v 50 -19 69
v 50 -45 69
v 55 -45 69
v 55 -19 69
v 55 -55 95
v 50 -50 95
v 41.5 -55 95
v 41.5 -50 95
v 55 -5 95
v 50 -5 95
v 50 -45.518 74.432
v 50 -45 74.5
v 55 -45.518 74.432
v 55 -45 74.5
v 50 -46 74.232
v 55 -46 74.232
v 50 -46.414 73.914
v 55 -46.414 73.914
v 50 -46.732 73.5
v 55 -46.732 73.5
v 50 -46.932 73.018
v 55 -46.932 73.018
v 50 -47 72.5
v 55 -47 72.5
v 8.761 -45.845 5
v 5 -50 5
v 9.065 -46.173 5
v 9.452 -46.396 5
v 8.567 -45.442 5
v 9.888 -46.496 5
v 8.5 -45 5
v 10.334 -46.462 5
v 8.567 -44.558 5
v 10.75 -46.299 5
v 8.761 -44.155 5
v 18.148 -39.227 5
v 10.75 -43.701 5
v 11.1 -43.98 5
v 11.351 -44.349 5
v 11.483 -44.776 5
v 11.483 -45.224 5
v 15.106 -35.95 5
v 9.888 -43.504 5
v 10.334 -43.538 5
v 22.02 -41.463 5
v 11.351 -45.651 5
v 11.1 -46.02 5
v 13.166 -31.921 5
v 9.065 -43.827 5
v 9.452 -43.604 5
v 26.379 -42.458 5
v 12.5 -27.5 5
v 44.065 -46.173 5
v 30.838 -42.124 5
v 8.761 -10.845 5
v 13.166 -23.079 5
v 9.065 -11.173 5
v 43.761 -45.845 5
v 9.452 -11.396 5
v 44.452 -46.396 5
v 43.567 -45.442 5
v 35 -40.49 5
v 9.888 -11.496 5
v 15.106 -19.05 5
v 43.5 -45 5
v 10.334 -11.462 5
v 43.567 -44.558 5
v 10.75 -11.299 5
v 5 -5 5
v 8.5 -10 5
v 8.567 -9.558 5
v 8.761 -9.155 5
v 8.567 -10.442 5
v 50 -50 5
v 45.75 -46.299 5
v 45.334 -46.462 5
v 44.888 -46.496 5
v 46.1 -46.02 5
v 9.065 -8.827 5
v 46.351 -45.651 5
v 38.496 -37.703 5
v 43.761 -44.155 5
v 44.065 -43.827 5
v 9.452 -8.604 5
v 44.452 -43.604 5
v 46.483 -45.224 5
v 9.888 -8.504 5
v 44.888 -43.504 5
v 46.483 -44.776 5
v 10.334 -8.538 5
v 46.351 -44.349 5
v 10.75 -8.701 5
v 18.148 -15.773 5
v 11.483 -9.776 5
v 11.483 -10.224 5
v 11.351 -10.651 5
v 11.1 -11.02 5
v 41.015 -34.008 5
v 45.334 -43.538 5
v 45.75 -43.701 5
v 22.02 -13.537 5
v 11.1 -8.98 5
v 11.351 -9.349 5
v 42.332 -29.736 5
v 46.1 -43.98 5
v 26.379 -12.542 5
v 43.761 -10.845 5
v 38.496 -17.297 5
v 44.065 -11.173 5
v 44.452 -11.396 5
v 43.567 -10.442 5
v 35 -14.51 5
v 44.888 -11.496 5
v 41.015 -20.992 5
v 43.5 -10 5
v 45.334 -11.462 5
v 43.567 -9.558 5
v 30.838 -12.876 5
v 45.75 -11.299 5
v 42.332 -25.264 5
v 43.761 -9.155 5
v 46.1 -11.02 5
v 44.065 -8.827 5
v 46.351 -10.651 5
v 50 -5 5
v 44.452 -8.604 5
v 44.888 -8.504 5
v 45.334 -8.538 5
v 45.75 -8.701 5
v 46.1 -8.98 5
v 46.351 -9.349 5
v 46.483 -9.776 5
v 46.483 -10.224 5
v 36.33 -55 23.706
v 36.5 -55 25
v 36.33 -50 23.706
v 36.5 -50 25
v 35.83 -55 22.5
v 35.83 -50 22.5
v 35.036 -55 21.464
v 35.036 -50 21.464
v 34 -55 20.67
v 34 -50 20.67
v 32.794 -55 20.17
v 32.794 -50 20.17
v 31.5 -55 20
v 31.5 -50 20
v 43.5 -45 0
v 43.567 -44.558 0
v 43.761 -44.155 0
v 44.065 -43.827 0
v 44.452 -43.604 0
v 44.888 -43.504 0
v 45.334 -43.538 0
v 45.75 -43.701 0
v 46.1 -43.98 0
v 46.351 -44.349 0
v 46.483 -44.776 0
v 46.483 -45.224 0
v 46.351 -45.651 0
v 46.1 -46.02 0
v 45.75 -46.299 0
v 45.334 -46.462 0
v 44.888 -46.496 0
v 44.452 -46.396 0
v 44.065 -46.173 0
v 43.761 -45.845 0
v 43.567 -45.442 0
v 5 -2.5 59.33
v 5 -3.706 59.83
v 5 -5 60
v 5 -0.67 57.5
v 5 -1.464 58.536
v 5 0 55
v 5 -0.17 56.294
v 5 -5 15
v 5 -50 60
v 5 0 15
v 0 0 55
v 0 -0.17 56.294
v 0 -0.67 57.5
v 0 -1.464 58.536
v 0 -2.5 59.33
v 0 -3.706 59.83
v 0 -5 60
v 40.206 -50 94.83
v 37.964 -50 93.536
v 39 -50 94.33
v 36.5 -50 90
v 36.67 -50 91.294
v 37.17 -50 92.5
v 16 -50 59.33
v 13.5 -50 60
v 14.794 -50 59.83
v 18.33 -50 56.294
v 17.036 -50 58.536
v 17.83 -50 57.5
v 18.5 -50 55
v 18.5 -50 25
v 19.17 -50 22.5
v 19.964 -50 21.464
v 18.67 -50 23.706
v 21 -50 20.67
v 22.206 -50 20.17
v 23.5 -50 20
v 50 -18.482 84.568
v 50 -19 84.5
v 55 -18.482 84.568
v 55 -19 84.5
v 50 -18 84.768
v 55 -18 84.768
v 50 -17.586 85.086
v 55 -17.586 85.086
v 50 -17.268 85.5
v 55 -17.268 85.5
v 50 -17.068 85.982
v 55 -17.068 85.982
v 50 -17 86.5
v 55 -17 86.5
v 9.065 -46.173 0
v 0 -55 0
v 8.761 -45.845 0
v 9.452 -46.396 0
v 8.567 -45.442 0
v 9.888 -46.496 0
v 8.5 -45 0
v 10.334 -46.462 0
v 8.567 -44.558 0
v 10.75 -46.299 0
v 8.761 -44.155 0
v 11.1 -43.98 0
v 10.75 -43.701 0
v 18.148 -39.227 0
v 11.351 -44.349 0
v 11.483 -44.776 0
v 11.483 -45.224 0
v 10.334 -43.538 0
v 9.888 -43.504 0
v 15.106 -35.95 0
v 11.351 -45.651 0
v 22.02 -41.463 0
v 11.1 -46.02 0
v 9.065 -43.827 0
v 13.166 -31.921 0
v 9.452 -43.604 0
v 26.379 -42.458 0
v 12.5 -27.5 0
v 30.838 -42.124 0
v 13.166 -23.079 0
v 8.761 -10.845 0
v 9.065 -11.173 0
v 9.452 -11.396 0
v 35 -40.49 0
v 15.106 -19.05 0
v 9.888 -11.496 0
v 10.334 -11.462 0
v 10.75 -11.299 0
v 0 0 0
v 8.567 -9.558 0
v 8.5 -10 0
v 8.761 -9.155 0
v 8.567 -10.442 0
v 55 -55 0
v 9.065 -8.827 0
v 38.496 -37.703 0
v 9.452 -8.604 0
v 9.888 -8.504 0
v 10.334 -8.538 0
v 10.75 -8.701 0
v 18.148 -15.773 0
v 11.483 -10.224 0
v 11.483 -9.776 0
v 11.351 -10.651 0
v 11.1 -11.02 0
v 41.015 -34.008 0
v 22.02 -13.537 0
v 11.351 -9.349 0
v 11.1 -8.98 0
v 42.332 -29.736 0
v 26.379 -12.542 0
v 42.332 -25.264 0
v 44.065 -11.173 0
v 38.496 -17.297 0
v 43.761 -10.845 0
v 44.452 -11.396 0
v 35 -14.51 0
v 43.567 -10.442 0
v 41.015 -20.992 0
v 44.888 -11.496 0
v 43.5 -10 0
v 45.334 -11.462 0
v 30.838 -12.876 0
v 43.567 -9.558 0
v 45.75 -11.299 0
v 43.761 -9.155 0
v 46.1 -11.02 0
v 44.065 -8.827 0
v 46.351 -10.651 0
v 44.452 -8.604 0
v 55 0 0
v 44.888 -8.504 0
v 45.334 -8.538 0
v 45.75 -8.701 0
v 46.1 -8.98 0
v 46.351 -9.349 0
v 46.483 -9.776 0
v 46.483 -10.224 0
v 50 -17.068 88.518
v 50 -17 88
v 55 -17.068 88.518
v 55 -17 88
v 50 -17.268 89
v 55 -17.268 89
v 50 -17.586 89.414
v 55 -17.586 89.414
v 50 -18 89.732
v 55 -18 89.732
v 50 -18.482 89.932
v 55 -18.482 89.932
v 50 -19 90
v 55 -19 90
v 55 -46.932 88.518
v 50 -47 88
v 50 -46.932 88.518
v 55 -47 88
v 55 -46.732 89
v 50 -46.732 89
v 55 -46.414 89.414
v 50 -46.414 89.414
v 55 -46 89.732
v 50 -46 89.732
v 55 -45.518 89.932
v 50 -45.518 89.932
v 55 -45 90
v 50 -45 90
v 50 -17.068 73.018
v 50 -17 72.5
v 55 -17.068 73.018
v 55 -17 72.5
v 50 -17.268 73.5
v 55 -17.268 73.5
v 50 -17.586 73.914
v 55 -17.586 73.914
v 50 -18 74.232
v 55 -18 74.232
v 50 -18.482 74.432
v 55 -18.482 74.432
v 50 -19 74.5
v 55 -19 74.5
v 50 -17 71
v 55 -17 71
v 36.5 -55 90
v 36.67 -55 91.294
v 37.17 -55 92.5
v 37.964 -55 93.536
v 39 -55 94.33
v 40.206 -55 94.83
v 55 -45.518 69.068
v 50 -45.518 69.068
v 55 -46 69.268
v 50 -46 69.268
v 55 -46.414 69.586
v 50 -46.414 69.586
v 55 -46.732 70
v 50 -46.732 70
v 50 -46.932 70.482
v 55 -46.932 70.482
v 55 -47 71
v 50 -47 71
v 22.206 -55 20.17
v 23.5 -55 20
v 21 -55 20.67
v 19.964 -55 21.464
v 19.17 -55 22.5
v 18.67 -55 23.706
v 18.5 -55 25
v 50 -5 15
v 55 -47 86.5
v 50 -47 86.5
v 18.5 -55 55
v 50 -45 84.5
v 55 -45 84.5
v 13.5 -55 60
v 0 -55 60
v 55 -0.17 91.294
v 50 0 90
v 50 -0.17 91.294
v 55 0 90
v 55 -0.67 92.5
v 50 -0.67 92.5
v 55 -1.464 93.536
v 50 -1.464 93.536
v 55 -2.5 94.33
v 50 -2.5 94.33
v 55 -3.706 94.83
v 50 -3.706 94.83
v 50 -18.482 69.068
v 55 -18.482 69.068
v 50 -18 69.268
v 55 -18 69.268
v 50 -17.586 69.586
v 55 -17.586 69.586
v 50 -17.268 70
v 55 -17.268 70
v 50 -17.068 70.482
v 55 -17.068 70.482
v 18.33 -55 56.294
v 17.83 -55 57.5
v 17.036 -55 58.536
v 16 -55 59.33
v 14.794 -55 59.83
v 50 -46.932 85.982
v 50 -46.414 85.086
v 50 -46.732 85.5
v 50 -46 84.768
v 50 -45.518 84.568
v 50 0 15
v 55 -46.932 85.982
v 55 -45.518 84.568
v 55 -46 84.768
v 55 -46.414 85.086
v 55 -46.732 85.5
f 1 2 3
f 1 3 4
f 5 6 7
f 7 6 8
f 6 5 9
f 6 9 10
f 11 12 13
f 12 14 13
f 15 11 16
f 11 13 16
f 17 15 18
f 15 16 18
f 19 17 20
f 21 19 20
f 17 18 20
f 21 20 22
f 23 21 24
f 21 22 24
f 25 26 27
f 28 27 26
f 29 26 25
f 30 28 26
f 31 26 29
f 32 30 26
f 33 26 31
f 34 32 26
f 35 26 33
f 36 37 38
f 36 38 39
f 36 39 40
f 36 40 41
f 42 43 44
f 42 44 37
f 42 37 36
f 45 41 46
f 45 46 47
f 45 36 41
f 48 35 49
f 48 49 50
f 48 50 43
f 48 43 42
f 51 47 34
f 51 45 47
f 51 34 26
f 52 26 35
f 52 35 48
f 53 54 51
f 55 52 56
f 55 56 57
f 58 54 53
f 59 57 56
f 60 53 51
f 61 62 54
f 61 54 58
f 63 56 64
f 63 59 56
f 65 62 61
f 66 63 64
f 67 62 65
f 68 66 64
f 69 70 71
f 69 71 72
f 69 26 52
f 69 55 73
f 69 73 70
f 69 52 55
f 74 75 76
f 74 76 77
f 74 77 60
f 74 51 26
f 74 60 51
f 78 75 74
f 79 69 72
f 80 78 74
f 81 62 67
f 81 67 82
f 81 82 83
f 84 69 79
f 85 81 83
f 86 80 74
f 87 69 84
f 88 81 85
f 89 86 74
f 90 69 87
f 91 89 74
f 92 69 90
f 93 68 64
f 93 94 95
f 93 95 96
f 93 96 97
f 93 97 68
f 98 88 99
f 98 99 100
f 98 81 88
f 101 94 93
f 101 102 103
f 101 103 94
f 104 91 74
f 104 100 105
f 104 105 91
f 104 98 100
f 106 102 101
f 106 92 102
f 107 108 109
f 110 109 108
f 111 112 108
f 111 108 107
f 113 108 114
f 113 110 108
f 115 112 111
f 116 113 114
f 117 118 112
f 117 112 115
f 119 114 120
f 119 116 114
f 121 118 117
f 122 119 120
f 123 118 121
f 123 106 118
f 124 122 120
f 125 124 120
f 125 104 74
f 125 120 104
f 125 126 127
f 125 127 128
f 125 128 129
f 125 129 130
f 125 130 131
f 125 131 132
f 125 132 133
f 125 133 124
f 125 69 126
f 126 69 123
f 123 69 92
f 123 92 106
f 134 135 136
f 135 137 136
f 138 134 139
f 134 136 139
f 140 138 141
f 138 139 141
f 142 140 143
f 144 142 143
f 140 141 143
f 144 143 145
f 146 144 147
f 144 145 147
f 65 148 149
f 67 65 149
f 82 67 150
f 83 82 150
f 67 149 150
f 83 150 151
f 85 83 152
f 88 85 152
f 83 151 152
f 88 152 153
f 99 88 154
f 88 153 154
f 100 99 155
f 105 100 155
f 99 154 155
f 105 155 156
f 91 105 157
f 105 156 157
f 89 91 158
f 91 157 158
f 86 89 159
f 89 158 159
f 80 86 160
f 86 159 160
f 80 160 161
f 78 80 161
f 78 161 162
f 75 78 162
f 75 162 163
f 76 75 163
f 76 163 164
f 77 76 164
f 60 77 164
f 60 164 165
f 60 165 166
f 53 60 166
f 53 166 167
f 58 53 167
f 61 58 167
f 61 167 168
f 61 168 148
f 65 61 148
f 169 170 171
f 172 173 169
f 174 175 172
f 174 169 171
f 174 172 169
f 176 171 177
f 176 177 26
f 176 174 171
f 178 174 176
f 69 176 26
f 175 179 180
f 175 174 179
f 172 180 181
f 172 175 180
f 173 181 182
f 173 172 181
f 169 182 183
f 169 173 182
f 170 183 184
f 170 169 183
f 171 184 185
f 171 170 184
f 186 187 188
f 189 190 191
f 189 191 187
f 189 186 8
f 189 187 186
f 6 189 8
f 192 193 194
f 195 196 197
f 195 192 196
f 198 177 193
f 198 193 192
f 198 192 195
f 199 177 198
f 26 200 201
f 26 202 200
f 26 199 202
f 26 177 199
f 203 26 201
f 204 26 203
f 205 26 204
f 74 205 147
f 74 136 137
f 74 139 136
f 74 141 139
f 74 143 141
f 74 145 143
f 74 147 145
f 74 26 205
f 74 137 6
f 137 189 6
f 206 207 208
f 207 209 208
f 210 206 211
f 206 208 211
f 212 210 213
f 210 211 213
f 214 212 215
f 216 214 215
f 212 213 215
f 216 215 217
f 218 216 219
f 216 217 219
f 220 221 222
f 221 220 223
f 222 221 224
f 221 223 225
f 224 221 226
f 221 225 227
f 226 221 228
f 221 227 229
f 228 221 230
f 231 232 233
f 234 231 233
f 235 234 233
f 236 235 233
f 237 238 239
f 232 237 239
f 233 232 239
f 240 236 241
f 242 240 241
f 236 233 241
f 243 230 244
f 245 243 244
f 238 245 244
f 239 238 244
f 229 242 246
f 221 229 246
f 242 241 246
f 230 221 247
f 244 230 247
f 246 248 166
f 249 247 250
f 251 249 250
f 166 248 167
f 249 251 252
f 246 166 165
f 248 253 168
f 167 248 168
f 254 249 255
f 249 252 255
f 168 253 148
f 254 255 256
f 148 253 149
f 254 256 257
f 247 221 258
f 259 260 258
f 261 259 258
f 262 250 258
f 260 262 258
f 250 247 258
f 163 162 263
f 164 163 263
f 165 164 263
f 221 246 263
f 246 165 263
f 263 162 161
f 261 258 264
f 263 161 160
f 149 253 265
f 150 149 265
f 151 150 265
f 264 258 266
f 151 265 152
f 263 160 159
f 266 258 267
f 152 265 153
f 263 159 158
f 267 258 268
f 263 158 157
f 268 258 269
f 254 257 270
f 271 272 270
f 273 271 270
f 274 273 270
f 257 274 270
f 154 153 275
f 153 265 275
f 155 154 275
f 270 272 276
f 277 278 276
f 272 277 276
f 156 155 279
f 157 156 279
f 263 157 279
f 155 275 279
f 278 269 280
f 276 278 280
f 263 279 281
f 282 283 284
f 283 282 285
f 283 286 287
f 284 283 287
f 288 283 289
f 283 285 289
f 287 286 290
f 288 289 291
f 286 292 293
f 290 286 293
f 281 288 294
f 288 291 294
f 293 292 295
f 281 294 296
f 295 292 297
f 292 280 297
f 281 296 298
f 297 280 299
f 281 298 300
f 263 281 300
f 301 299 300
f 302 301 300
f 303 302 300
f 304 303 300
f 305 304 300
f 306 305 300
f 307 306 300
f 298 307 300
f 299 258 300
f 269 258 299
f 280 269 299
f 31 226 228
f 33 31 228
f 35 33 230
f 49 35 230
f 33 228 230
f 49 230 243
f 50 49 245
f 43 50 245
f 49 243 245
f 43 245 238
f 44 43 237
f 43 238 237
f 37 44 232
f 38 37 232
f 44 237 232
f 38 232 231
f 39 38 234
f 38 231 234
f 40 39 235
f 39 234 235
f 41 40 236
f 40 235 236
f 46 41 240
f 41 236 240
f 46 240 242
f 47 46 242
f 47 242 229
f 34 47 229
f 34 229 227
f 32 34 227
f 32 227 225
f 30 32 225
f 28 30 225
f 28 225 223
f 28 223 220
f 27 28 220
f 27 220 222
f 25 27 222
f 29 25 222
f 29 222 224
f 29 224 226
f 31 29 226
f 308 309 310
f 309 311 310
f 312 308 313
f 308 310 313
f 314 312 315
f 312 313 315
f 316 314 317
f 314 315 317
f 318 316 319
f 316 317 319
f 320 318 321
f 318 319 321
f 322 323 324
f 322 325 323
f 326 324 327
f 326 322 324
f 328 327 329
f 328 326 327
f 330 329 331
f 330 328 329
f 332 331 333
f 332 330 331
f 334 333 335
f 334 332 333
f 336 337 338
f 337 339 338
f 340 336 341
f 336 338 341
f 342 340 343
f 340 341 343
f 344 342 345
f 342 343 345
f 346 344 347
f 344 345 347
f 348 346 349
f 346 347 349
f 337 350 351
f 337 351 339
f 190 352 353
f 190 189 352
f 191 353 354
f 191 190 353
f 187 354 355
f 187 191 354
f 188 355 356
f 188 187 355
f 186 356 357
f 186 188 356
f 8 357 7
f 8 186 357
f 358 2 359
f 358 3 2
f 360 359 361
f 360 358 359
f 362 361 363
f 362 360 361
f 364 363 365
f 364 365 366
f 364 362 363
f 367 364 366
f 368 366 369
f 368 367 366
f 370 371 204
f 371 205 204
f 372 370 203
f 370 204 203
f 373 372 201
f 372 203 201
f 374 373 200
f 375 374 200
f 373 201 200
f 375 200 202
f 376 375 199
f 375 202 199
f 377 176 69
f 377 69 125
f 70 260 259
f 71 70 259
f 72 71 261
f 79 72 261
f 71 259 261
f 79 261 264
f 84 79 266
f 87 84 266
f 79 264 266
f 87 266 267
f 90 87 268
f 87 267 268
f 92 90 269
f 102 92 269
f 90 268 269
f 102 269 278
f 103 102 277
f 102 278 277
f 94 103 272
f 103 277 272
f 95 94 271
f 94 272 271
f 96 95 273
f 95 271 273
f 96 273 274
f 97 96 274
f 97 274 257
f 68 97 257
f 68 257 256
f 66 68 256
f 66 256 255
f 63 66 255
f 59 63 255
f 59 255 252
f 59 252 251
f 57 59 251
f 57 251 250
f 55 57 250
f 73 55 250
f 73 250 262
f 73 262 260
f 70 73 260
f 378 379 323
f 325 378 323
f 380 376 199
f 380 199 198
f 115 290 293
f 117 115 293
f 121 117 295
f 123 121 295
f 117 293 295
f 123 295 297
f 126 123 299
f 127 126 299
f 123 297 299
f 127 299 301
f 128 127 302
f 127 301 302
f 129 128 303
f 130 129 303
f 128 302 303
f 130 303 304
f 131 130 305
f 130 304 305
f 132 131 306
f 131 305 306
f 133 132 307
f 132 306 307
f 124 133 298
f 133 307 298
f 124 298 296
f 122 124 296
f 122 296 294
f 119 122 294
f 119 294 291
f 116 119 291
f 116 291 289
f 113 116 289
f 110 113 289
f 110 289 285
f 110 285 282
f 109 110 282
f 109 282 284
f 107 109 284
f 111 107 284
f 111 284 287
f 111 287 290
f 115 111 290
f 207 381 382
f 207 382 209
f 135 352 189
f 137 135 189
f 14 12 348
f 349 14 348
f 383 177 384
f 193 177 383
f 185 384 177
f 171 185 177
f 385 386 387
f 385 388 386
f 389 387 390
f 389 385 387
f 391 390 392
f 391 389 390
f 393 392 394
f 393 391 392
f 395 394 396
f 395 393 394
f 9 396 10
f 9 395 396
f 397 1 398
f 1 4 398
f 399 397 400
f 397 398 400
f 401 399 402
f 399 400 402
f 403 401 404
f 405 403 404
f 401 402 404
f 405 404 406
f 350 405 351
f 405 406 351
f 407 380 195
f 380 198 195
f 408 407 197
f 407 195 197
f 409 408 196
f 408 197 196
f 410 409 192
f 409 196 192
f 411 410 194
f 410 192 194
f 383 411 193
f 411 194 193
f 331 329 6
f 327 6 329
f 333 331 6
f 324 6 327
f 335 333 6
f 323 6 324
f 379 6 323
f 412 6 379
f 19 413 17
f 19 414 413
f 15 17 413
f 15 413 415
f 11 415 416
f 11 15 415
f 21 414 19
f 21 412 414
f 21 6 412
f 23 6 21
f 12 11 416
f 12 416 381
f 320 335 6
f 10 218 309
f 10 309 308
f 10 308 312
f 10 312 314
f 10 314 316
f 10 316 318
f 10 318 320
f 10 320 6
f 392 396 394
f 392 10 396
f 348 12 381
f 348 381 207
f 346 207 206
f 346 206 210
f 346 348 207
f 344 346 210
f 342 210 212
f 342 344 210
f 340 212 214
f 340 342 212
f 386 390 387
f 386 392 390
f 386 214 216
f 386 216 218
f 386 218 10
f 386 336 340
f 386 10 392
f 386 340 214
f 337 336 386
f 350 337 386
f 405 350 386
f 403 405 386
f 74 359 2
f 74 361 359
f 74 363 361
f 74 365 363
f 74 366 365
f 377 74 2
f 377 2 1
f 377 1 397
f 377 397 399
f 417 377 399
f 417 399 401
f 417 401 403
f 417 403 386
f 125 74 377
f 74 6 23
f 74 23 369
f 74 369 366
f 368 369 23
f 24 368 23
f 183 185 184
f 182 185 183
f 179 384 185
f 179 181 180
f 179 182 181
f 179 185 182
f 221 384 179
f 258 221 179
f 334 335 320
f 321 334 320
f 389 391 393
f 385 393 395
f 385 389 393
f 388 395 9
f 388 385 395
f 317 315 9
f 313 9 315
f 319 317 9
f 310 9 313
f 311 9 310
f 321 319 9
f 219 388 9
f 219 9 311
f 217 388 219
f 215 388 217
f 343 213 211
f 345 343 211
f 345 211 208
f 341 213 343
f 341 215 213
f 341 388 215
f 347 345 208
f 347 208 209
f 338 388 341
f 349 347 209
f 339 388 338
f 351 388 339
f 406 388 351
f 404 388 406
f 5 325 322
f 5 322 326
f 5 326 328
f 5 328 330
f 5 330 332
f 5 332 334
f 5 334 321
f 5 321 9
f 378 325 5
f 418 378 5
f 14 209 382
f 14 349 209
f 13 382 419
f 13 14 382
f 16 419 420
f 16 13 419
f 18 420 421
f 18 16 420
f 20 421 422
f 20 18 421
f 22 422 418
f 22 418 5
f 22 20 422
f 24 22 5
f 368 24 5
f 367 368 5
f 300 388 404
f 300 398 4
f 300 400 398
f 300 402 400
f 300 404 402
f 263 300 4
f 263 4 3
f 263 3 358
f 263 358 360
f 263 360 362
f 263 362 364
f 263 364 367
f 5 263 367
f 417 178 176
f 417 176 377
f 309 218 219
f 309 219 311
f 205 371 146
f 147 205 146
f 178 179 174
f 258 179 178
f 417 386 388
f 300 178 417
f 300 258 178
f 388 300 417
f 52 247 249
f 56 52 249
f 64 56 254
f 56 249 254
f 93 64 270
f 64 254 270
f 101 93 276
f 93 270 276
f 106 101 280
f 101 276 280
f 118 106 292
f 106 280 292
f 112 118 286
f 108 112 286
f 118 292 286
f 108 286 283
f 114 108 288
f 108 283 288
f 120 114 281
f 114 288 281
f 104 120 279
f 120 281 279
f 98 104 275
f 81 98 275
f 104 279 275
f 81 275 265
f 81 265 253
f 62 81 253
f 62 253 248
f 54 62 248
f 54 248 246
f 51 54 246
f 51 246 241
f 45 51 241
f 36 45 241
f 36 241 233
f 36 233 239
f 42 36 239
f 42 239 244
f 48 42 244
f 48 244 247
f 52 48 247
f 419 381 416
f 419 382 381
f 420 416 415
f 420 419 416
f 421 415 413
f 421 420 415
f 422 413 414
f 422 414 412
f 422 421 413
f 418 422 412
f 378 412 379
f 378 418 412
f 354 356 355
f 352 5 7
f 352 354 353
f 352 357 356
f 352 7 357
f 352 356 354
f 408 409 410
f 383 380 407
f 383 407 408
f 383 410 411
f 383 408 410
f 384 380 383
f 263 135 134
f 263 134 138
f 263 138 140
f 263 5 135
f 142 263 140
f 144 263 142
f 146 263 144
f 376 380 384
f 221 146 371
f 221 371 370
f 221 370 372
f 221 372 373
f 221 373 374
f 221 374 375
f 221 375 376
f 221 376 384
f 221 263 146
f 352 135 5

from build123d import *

# Parameters (mm, degrees)
CROQUIS1_W              = 55
CROQUIS1_H              = 55
SALIENTE_EXTRUIR1_DEPTH = 60
CROQUIS2_W              = 45
CROQUIS2_H              = 45
CORTAR_EXTRUIR1_DEPTH   = 55
CORTAR_EXTRUIR2_REACH   = 57
CROQUIS3_W              = 18
CROQUIS3_H              = 40
CORTAR_EXTRUIR3_REACH   = 57
CROQUIS4_W              = 45
CROQUIS4_H              = 45
CORTAR_EXTRUIR4_REACH   = 62
CROQUIS5_R              = 1.5
CROQUIS5_R_2            = 15
SALIENTE_EXTRUIR2_DEPTH = 35
REDONDEO3_R             = 5
CORTAR_EXTRUIR5_REACH   = 7
CROQUIS7_W              = 5.5
CROQUIS7_H              = 30
REDONDEO4_R             = 2


with BuildPart() as part:
    # Croquis1 → Saliente-Extruir1 (new body)
    with BuildSketch(Plane.XY):
        with Locations((27.5, -27.5)):
            Rectangle(CROQUIS1_W, CROQUIS1_H)
    extrude(amount=SALIENTE_EXTRUIR1_DEPTH)

    # Croquis2 → Cortar-Extruir1 (cut)
    with BuildSketch(Plane.XY.offset(60)):
        with Locations((27.5, -27.5)):
            Rectangle(CROQUIS2_W, CROQUIS2_H)
    extrude(amount=-CORTAR_EXTRUIR1_DEPTH, mode=Mode.SUBTRACT)

    # Croquis3 → Cortar-Extruir2 (cut, up to next)
    with BuildSketch(Plane.XZ.offset(55), mode=Mode.PRIVATE) as cortar_extruir2_sk1:
        with Locations((27.5, 40)):
            Rectangle(CROQUIS3_W, CROQUIS3_H)
    cortar_extruir2_tool1 = extrude(cortar_extruir2_sk1.sketch, amount=-CORTAR_EXTRUIR2_REACH, mode=Mode.PRIVATE) & part.part
    add(cortar_extruir2_tool1.solids().sort_by_distance((27.5, -55, 40))[0], mode=Mode.SUBTRACT)

    # Croquis4 → Cortar-Extruir3 (cut, up to next)
    with BuildSketch(Plane(origin=(0, 0, 0), x_dir=(1, 0, 0), z_dir=(0, 1, 0)), mode=Mode.PRIVATE) as cortar_extruir3_sk1:
        with Locations((27.5, -37.5)):
            Rectangle(CROQUIS4_W, CROQUIS4_H)
    cortar_extruir3_tool1 = extrude(cortar_extruir3_sk1.sketch, amount=-CORTAR_EXTRUIR3_REACH, mode=Mode.PRIVATE) & part.part
    add(cortar_extruir3_tool1.solids().sort_by_distance((27.5, 0, 37.5))[0], mode=Mode.SUBTRACT)

    # Croquis5 → Cortar-Extruir4 (cut, up to next)
    with BuildSketch(Plane(origin=(0, 0, 0), x_dir=(-1, 0, 0), z_dir=(0, 0, -1)), mode=Mode.PRIVATE) as cortar_extruir4_sk1:
        with Locations((-45, -10)):
            Circle(CROQUIS5_R)
    cortar_extruir4_tool1 = extrude(cortar_extruir4_sk1.sketch, amount=-CORTAR_EXTRUIR4_REACH, mode=Mode.PRIVATE) & part.part
    add(cortar_extruir4_tool1.solids().sort_by_distance((45, -10, 0))[0], mode=Mode.SUBTRACT)
    # Croquis5 → Cortar-Extruir4 (cut, up to next)
    with BuildSketch(Plane(origin=(0, 0, 0), x_dir=(-1, 0, 0), z_dir=(0, 0, -1)), mode=Mode.PRIVATE) as cortar_extruir4_sk2:
        with Locations((-10, -10)):
            Circle(CROQUIS5_R)
    cortar_extruir4_tool2 = extrude(cortar_extruir4_sk2.sketch, amount=-CORTAR_EXTRUIR4_REACH, mode=Mode.PRIVATE) & part.part
    add(cortar_extruir4_tool2.solids().sort_by_distance((10, -10, 0))[0], mode=Mode.SUBTRACT)
    # Croquis5 → Cortar-Extruir4 (cut, up to next)
    with BuildSketch(Plane(origin=(0, 0, 0), x_dir=(-1, 0, 0), z_dir=(0, 0, -1)), mode=Mode.PRIVATE) as cortar_extruir4_sk3:
        with Locations((-45, -45)):
            Circle(CROQUIS5_R)
    cortar_extruir4_tool3 = extrude(cortar_extruir4_sk3.sketch, amount=-CORTAR_EXTRUIR4_REACH, mode=Mode.PRIVATE) & part.part
    add(cortar_extruir4_tool3.solids().sort_by_distance((45, -45, 0))[0], mode=Mode.SUBTRACT)
    # Croquis5 → Cortar-Extruir4 (cut, up to next)
    with BuildSketch(Plane(origin=(0, 0, 0), x_dir=(-1, 0, 0), z_dir=(0, 0, -1)), mode=Mode.PRIVATE) as cortar_extruir4_sk4:
        with Locations((-10, -45)):
            Circle(CROQUIS5_R)
    cortar_extruir4_tool4 = extrude(cortar_extruir4_sk4.sketch, amount=-CORTAR_EXTRUIR4_REACH, mode=Mode.PRIVATE) & part.part
    add(cortar_extruir4_tool4.solids().sort_by_distance((10, -45, 0))[0], mode=Mode.SUBTRACT)
    # Croquis5 → Cortar-Extruir4 (cut, up to next)
    with BuildSketch(Plane(origin=(0, 0, 0), x_dir=(-1, 0, 0), z_dir=(0, 0, -1)), mode=Mode.PRIVATE) as cortar_extruir4_sk5:
        with Locations((-27.5, -27.5)):
            Circle(CROQUIS5_R_2)
    cortar_extruir4_tool5 = extrude(cortar_extruir4_sk5.sketch, amount=-CORTAR_EXTRUIR4_REACH, mode=Mode.PRIVATE) & part.part
    add(cortar_extruir4_tool5.solids().sort_by_distance((27.5, -27.5, 0))[0], mode=Mode.SUBTRACT)

    # Croquis6 → Saliente-Extruir2 (add)
    with BuildSketch(Plane.XY.offset(60)):
        Polygon((50, 0), (55, 0), (55, -55), (36.5, -55), (36.5, -50), (50, -50), align=None)
    extrude(amount=SALIENTE_EXTRUIR2_DEPTH)

    # Redondeo3
    redondeo3_edges = [part.edges().sort_by_distance(p)[0] for p in [
        (36.5, -52.5, 20),
        (18.5, -52.5, 60),
        (18.5, -52.5, 20),
        (2.5, 0, 60),
        (36.5, -52.5, 95),
        (52.5, 0, 95),
    ]]
    fillet(redondeo3_edges, radius=REDONDEO3_R)

    # Croquis7 → Cortar-Extruir5 (cut, up to next)
    with BuildSketch(Plane.ZY.offset(-50), mode=Mode.PRIVATE) as cortar_extruir5_sk1:
        with Locations((87.25, -32)):
            Rectangle(CROQUIS7_W, CROQUIS7_H)
    cortar_extruir5_tool1 = extrude(cortar_extruir5_sk1.sketch, amount=-CORTAR_EXTRUIR5_REACH, mode=Mode.PRIVATE) & part.part
    add(cortar_extruir5_tool1.solids().sort_by_distance((50, -32, 87.25))[0], mode=Mode.SUBTRACT)
    # Croquis7 → Cortar-Extruir5 (cut, up to next)
    with BuildSketch(Plane.ZY.offset(-50), mode=Mode.PRIVATE) as cortar_extruir5_sk2:
        with Locations((71.75, -32)):
            Rectangle(CROQUIS7_W, CROQUIS7_H)
    cortar_extruir5_tool2 = extrude(cortar_extruir5_sk2.sketch, amount=-CORTAR_EXTRUIR5_REACH, mode=Mode.PRIVATE) & part.part
    add(cortar_extruir5_tool2.solids().sort_by_distance((50, -32, 71.75))[0], mode=Mode.SUBTRACT)

    # Redondeo4
    redondeo4_edges = [part.edges().sort_by_distance(p)[0] for p in [
        (52.5, -47, 84.5),
        (52.5, -17, 84.5),
        (52.5, -17, 90),
        (52.5, -47, 90),
        (52.5, -47, 69),
        (52.5, -17, 69),
        (52.5, -17, 74.5),
        (52.5, -47, 74.5),
    ]]
    fillet(redondeo4_edges, radius=REDONDEO4_R)


solid = part.part
